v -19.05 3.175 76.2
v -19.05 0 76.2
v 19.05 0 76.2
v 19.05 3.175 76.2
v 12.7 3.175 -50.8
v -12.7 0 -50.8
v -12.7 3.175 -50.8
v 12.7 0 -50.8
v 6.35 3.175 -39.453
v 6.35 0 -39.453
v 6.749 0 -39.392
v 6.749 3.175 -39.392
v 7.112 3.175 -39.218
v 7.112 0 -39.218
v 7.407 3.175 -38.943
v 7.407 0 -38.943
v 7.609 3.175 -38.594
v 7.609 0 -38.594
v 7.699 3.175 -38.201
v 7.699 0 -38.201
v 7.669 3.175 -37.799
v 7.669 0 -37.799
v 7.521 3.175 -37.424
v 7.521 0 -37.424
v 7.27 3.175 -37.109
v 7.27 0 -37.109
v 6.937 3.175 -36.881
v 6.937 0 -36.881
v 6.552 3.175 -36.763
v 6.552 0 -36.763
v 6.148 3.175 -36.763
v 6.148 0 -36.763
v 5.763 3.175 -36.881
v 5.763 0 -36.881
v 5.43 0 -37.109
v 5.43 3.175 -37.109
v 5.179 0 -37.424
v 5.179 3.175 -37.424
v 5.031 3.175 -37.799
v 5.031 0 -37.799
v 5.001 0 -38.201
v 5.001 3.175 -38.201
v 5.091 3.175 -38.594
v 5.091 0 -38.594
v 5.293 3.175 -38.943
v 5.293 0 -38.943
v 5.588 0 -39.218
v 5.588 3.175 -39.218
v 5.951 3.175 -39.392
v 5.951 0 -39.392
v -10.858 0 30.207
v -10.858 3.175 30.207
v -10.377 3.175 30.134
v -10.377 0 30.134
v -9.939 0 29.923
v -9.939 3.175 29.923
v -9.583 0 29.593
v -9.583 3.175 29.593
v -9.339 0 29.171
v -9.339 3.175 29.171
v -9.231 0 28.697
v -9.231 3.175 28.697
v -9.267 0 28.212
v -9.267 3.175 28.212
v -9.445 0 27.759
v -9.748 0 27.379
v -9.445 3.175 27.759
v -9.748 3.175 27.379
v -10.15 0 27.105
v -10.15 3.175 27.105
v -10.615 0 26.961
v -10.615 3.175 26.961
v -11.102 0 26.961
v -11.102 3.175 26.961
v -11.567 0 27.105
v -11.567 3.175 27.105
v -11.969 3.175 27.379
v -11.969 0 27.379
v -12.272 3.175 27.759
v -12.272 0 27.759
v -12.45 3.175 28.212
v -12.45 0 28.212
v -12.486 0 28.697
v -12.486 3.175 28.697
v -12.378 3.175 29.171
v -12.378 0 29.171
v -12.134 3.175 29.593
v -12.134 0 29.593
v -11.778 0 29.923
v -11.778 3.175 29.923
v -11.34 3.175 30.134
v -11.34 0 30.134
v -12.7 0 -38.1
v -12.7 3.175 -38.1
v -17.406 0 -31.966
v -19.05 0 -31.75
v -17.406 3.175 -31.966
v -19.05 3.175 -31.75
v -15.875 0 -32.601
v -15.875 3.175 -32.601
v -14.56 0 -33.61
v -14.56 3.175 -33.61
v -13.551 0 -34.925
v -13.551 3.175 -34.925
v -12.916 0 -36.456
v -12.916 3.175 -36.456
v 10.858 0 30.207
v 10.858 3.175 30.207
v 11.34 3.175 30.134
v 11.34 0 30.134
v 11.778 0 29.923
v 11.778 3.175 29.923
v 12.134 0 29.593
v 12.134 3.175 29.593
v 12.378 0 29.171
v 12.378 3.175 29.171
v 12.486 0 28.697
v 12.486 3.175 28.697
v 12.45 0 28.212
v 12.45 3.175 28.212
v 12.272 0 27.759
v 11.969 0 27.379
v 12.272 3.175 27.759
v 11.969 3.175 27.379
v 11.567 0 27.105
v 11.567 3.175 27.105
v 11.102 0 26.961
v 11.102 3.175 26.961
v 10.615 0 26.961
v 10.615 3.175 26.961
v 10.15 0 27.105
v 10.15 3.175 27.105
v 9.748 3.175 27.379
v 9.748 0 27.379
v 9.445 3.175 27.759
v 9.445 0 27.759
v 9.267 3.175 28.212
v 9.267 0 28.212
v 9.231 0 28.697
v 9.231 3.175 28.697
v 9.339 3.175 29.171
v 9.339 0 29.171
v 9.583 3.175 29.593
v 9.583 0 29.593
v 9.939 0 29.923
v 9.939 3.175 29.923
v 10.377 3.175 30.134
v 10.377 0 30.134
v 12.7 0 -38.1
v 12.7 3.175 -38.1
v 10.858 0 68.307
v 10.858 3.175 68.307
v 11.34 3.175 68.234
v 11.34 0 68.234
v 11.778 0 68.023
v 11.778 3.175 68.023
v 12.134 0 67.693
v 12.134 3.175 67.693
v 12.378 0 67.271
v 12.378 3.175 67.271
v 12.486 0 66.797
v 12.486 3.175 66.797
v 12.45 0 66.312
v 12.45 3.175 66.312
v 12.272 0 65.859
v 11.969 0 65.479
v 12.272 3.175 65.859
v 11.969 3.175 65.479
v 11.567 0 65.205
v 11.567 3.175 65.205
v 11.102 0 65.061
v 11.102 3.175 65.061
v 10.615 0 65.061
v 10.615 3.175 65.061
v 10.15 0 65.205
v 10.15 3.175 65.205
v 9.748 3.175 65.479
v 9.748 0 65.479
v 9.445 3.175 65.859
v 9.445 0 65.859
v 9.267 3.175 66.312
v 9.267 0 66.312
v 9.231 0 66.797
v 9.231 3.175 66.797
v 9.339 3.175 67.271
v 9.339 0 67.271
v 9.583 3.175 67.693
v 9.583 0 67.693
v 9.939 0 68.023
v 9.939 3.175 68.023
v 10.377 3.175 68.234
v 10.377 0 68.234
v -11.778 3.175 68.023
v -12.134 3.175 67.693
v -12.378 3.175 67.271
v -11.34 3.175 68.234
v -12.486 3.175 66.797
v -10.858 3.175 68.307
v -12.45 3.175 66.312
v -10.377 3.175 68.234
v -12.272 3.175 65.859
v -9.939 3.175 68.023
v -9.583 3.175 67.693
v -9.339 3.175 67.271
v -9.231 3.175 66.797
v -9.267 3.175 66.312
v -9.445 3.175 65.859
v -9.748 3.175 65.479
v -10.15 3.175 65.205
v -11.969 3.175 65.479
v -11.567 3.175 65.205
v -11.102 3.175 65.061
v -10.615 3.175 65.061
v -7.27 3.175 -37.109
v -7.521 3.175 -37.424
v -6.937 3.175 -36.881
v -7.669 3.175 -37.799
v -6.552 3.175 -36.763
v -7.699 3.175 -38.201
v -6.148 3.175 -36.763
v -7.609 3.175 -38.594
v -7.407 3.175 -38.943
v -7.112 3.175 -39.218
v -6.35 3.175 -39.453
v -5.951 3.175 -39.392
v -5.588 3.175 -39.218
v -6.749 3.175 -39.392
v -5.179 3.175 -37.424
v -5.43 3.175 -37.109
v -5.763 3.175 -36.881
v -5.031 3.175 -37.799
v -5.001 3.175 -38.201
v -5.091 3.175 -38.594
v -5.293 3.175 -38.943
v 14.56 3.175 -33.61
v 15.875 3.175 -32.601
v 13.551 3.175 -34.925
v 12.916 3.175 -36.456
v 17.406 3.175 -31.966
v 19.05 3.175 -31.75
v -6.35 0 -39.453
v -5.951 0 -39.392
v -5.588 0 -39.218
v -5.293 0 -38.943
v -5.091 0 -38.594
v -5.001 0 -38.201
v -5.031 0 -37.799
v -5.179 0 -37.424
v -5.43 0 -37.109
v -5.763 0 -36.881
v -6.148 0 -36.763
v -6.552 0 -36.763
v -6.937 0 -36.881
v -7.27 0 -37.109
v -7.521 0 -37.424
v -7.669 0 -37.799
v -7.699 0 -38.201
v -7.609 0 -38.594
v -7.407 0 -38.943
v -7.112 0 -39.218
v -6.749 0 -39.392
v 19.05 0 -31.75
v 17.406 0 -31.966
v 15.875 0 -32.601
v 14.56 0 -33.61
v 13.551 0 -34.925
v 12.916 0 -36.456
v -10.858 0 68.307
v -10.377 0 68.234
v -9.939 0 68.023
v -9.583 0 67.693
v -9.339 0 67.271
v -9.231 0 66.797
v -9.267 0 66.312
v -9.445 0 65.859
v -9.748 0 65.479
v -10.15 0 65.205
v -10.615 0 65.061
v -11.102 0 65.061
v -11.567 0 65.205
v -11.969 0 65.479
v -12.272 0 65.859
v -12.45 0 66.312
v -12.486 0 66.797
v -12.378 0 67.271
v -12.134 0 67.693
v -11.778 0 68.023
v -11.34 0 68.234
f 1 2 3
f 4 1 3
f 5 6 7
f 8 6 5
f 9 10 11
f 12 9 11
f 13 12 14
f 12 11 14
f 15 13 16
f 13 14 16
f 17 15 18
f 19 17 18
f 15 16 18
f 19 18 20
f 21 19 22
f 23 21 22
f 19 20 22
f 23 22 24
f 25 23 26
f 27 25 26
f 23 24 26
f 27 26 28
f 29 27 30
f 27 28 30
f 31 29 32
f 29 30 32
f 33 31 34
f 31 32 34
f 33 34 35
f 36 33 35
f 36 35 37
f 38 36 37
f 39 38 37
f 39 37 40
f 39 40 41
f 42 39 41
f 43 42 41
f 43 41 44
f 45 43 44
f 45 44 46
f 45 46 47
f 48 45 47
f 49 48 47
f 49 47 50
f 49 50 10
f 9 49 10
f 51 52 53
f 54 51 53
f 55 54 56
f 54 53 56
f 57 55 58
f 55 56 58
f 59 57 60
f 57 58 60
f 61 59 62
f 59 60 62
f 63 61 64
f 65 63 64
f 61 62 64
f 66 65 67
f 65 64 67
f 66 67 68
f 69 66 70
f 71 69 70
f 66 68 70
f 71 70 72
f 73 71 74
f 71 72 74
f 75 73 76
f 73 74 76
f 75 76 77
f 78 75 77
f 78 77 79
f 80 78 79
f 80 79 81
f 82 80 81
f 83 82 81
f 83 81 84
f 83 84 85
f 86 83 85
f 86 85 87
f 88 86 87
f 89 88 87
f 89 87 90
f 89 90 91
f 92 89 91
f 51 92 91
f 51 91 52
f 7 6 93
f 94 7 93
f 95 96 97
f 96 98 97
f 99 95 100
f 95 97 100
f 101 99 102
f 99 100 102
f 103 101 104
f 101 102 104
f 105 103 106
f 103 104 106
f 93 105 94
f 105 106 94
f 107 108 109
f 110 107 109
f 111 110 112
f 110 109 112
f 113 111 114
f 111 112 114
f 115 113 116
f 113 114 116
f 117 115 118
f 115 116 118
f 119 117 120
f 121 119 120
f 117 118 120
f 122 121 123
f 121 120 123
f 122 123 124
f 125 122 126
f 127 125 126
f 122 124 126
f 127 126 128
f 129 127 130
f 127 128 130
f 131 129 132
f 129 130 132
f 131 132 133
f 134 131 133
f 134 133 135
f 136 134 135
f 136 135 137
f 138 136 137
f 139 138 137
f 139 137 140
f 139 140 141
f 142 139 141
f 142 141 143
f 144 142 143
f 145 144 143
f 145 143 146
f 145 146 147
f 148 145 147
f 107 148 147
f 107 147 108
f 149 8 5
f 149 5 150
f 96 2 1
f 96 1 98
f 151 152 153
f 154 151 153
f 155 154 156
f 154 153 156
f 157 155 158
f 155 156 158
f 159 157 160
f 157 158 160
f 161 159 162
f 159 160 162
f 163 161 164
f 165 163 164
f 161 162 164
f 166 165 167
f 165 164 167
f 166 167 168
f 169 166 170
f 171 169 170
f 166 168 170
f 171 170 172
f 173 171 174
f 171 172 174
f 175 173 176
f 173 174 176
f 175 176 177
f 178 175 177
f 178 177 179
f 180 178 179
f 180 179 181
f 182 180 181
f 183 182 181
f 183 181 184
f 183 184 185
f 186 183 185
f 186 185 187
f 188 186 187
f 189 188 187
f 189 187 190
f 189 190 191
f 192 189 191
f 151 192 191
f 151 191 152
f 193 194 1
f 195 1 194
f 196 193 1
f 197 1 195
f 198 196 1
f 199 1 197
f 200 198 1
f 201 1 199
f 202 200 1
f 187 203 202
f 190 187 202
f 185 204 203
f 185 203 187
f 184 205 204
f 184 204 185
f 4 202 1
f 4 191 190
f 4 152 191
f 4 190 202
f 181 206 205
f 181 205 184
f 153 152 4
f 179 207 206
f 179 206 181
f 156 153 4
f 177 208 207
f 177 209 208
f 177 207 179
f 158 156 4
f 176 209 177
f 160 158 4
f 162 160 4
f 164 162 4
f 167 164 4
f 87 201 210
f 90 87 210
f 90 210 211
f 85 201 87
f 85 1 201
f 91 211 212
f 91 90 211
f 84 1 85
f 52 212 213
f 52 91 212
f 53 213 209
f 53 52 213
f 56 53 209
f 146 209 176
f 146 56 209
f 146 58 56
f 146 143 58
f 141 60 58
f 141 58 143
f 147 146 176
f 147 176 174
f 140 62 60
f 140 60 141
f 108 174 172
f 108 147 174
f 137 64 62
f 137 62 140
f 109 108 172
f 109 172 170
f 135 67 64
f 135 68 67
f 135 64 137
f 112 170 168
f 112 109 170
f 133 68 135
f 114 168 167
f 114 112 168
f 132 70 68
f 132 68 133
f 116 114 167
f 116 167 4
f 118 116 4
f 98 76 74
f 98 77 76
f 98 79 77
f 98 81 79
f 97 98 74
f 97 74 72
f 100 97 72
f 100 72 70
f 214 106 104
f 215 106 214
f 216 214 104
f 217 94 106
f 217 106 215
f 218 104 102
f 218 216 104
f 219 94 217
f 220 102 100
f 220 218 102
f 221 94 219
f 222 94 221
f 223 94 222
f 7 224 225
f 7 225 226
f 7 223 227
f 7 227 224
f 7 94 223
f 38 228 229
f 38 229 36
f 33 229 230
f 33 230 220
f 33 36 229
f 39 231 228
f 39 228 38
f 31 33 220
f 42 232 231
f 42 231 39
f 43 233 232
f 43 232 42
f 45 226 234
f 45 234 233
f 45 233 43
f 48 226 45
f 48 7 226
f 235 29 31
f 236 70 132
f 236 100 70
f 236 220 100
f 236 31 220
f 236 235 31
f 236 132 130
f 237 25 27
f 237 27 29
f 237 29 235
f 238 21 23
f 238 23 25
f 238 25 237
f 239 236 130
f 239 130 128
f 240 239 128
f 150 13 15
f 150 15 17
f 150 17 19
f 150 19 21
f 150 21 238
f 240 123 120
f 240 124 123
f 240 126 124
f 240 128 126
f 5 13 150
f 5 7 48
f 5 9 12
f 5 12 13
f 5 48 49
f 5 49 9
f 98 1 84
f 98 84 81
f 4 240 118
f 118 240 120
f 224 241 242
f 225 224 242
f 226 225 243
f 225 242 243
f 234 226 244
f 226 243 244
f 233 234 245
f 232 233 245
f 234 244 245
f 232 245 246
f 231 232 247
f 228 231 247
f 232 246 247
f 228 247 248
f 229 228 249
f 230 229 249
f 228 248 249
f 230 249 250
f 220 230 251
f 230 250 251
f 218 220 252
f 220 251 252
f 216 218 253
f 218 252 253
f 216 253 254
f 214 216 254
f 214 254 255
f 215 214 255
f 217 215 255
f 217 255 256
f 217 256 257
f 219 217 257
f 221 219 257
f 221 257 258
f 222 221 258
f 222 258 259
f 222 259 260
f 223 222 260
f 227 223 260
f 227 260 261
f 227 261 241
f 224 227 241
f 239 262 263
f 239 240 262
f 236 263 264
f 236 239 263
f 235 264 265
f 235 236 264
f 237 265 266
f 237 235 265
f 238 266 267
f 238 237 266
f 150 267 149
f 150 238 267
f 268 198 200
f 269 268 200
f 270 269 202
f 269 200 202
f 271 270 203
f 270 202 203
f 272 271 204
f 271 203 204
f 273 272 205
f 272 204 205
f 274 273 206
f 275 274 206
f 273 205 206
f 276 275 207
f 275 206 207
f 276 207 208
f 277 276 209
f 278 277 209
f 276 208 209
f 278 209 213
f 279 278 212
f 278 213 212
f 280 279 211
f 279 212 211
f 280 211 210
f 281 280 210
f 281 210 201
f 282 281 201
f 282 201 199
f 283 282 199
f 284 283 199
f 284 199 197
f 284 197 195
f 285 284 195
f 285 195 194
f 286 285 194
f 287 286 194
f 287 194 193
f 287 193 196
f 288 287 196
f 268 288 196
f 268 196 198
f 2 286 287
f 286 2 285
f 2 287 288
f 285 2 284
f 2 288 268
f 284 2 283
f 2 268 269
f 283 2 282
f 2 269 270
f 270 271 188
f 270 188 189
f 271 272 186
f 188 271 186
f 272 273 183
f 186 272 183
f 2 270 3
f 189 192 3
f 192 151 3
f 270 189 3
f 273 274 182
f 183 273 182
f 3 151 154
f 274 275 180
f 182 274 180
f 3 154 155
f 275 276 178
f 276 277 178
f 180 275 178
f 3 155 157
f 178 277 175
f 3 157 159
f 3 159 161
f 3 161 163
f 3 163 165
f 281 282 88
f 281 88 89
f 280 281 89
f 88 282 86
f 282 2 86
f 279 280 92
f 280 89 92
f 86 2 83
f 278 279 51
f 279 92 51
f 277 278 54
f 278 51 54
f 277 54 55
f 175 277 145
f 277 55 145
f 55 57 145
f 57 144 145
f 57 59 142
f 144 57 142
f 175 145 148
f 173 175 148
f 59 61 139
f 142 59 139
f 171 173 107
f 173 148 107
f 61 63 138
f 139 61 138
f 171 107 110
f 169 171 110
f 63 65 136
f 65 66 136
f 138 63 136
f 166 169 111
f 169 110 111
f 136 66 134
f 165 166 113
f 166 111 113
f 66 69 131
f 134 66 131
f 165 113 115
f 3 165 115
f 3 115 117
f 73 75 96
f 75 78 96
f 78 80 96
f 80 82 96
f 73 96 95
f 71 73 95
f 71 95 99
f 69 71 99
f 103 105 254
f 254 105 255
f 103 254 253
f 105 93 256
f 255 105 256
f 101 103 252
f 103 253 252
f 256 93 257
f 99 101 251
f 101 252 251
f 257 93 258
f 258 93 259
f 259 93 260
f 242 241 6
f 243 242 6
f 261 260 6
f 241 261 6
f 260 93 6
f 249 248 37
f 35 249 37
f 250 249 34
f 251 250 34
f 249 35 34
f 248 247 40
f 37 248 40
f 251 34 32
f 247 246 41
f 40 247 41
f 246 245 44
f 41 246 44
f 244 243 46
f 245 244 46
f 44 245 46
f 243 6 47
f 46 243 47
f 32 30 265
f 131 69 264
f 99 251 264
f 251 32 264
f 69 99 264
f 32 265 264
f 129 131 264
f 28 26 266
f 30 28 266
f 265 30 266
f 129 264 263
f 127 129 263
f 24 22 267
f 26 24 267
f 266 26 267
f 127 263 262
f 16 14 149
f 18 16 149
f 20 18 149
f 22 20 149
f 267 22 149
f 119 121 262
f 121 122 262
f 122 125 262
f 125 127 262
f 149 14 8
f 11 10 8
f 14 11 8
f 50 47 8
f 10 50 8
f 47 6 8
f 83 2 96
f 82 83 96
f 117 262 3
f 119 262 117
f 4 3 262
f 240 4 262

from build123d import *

# Parameters (mm, degrees)
SKETCH1_W                  = 38.1
SKETCH1_H                  = 127
EXTRUDE1_DEPTH             = 3.175
F_4_CLEARANCE_HOLE1_D      = 3.2639
F_4_CLEARANCE_HOLE1_DEPTH  = 101.6
F_4_CLEARANCE_HOLE1_TIP    = 0.980574487
SKETCH4_W                  = 6.35
SKETCH4_H                  = 19.05
CUT_EXTRUDE1_DEPTH         = 79.60930686
TAP_DRILL_FOR_6_TAP1_D     = 2.7051
TAP_DRILL_FOR_6_TAP1_DEPTH = 3.302
TAP_DRILL_FOR_6_TAP1_TIP   = 0.81269403
FILLET1_R                  = 6.35


with BuildPart() as part:
    # Sketch1 → Extrude1 (new body)
    with BuildSketch(Plane(origin=(0, 0, 0), x_dir=(1, 0, 0), z_dir=(0, 1, 0))):
        with Locations((0, -12.7)):
            Rectangle(SKETCH1_W, SKETCH1_H)
    extrude(amount=EXTRUDE1_DEPTH)

    # #4 Clearance Hole1
    with Locations(Plane(origin=(-10.8585, 0, 28.575), x_dir=(0, 0, -1), z_dir=(0, -1, 0))):
        with Locations((0, 0), (0, 21.717), (-38.1, 0), (-38.1, 21.717)):
            Hole(F_4_CLEARANCE_HOLE1_D / 2, depth=F_4_CLEARANCE_HOLE1_DEPTH)
            with Locations((0, 0, -(F_4_CLEARANCE_HOLE1_DEPTH + F_4_CLEARANCE_HOLE1_TIP / 2))):  # 118° drill point
                Cone(0, F_4_CLEARANCE_HOLE1_D / 2, F_4_CLEARANCE_HOLE1_TIP, mode=Mode.SUBTRACT)

    # Sketch4 → Cut-Extrude1 (cut, through all)
    with BuildSketch(Plane.XZ):
        with Locations((-15.875, -41.275)):
            Rectangle(SKETCH4_W, SKETCH4_H)
        with Locations((15.875, -41.275)):
            Rectangle(SKETCH4_W, SKETCH4_H)
    extrude(amount=-CUT_EXTRUDE1_DEPTH, mode=Mode.SUBTRACT)

    # Tap Drill for #6 Tap1
    with Locations(Plane(origin=(-6.35, 3.175, -38.1), x_dir=(0, 0, 1), z_dir=(0, 1, 0))):
        with Locations((0, 0), (0, 12.7)):
            Hole(TAP_DRILL_FOR_6_TAP1_D / 2, depth=TAP_DRILL_FOR_6_TAP1_DEPTH)
            with Locations((0, 0, -(TAP_DRILL_FOR_6_TAP1_DEPTH + TAP_DRILL_FOR_6_TAP1_TIP / 2))):  # 118° drill point
                Cone(0, TAP_DRILL_FOR_6_TAP1_D / 2, TAP_DRILL_FOR_6_TAP1_TIP, mode=Mode.SUBTRACT)

    # Fillet1
    fillet1_edges = [part.edges().sort_by_distance(p)[0] for p in [
        (-12.7, 1.5875, -31.75),
        (12.7, 1.5875, -31.75),
    ]]
    fillet(fillet1_edges, radius=FILLET1_R - 0.0001)  # a hair under: the kernel refuses the full size


solid = part.part
